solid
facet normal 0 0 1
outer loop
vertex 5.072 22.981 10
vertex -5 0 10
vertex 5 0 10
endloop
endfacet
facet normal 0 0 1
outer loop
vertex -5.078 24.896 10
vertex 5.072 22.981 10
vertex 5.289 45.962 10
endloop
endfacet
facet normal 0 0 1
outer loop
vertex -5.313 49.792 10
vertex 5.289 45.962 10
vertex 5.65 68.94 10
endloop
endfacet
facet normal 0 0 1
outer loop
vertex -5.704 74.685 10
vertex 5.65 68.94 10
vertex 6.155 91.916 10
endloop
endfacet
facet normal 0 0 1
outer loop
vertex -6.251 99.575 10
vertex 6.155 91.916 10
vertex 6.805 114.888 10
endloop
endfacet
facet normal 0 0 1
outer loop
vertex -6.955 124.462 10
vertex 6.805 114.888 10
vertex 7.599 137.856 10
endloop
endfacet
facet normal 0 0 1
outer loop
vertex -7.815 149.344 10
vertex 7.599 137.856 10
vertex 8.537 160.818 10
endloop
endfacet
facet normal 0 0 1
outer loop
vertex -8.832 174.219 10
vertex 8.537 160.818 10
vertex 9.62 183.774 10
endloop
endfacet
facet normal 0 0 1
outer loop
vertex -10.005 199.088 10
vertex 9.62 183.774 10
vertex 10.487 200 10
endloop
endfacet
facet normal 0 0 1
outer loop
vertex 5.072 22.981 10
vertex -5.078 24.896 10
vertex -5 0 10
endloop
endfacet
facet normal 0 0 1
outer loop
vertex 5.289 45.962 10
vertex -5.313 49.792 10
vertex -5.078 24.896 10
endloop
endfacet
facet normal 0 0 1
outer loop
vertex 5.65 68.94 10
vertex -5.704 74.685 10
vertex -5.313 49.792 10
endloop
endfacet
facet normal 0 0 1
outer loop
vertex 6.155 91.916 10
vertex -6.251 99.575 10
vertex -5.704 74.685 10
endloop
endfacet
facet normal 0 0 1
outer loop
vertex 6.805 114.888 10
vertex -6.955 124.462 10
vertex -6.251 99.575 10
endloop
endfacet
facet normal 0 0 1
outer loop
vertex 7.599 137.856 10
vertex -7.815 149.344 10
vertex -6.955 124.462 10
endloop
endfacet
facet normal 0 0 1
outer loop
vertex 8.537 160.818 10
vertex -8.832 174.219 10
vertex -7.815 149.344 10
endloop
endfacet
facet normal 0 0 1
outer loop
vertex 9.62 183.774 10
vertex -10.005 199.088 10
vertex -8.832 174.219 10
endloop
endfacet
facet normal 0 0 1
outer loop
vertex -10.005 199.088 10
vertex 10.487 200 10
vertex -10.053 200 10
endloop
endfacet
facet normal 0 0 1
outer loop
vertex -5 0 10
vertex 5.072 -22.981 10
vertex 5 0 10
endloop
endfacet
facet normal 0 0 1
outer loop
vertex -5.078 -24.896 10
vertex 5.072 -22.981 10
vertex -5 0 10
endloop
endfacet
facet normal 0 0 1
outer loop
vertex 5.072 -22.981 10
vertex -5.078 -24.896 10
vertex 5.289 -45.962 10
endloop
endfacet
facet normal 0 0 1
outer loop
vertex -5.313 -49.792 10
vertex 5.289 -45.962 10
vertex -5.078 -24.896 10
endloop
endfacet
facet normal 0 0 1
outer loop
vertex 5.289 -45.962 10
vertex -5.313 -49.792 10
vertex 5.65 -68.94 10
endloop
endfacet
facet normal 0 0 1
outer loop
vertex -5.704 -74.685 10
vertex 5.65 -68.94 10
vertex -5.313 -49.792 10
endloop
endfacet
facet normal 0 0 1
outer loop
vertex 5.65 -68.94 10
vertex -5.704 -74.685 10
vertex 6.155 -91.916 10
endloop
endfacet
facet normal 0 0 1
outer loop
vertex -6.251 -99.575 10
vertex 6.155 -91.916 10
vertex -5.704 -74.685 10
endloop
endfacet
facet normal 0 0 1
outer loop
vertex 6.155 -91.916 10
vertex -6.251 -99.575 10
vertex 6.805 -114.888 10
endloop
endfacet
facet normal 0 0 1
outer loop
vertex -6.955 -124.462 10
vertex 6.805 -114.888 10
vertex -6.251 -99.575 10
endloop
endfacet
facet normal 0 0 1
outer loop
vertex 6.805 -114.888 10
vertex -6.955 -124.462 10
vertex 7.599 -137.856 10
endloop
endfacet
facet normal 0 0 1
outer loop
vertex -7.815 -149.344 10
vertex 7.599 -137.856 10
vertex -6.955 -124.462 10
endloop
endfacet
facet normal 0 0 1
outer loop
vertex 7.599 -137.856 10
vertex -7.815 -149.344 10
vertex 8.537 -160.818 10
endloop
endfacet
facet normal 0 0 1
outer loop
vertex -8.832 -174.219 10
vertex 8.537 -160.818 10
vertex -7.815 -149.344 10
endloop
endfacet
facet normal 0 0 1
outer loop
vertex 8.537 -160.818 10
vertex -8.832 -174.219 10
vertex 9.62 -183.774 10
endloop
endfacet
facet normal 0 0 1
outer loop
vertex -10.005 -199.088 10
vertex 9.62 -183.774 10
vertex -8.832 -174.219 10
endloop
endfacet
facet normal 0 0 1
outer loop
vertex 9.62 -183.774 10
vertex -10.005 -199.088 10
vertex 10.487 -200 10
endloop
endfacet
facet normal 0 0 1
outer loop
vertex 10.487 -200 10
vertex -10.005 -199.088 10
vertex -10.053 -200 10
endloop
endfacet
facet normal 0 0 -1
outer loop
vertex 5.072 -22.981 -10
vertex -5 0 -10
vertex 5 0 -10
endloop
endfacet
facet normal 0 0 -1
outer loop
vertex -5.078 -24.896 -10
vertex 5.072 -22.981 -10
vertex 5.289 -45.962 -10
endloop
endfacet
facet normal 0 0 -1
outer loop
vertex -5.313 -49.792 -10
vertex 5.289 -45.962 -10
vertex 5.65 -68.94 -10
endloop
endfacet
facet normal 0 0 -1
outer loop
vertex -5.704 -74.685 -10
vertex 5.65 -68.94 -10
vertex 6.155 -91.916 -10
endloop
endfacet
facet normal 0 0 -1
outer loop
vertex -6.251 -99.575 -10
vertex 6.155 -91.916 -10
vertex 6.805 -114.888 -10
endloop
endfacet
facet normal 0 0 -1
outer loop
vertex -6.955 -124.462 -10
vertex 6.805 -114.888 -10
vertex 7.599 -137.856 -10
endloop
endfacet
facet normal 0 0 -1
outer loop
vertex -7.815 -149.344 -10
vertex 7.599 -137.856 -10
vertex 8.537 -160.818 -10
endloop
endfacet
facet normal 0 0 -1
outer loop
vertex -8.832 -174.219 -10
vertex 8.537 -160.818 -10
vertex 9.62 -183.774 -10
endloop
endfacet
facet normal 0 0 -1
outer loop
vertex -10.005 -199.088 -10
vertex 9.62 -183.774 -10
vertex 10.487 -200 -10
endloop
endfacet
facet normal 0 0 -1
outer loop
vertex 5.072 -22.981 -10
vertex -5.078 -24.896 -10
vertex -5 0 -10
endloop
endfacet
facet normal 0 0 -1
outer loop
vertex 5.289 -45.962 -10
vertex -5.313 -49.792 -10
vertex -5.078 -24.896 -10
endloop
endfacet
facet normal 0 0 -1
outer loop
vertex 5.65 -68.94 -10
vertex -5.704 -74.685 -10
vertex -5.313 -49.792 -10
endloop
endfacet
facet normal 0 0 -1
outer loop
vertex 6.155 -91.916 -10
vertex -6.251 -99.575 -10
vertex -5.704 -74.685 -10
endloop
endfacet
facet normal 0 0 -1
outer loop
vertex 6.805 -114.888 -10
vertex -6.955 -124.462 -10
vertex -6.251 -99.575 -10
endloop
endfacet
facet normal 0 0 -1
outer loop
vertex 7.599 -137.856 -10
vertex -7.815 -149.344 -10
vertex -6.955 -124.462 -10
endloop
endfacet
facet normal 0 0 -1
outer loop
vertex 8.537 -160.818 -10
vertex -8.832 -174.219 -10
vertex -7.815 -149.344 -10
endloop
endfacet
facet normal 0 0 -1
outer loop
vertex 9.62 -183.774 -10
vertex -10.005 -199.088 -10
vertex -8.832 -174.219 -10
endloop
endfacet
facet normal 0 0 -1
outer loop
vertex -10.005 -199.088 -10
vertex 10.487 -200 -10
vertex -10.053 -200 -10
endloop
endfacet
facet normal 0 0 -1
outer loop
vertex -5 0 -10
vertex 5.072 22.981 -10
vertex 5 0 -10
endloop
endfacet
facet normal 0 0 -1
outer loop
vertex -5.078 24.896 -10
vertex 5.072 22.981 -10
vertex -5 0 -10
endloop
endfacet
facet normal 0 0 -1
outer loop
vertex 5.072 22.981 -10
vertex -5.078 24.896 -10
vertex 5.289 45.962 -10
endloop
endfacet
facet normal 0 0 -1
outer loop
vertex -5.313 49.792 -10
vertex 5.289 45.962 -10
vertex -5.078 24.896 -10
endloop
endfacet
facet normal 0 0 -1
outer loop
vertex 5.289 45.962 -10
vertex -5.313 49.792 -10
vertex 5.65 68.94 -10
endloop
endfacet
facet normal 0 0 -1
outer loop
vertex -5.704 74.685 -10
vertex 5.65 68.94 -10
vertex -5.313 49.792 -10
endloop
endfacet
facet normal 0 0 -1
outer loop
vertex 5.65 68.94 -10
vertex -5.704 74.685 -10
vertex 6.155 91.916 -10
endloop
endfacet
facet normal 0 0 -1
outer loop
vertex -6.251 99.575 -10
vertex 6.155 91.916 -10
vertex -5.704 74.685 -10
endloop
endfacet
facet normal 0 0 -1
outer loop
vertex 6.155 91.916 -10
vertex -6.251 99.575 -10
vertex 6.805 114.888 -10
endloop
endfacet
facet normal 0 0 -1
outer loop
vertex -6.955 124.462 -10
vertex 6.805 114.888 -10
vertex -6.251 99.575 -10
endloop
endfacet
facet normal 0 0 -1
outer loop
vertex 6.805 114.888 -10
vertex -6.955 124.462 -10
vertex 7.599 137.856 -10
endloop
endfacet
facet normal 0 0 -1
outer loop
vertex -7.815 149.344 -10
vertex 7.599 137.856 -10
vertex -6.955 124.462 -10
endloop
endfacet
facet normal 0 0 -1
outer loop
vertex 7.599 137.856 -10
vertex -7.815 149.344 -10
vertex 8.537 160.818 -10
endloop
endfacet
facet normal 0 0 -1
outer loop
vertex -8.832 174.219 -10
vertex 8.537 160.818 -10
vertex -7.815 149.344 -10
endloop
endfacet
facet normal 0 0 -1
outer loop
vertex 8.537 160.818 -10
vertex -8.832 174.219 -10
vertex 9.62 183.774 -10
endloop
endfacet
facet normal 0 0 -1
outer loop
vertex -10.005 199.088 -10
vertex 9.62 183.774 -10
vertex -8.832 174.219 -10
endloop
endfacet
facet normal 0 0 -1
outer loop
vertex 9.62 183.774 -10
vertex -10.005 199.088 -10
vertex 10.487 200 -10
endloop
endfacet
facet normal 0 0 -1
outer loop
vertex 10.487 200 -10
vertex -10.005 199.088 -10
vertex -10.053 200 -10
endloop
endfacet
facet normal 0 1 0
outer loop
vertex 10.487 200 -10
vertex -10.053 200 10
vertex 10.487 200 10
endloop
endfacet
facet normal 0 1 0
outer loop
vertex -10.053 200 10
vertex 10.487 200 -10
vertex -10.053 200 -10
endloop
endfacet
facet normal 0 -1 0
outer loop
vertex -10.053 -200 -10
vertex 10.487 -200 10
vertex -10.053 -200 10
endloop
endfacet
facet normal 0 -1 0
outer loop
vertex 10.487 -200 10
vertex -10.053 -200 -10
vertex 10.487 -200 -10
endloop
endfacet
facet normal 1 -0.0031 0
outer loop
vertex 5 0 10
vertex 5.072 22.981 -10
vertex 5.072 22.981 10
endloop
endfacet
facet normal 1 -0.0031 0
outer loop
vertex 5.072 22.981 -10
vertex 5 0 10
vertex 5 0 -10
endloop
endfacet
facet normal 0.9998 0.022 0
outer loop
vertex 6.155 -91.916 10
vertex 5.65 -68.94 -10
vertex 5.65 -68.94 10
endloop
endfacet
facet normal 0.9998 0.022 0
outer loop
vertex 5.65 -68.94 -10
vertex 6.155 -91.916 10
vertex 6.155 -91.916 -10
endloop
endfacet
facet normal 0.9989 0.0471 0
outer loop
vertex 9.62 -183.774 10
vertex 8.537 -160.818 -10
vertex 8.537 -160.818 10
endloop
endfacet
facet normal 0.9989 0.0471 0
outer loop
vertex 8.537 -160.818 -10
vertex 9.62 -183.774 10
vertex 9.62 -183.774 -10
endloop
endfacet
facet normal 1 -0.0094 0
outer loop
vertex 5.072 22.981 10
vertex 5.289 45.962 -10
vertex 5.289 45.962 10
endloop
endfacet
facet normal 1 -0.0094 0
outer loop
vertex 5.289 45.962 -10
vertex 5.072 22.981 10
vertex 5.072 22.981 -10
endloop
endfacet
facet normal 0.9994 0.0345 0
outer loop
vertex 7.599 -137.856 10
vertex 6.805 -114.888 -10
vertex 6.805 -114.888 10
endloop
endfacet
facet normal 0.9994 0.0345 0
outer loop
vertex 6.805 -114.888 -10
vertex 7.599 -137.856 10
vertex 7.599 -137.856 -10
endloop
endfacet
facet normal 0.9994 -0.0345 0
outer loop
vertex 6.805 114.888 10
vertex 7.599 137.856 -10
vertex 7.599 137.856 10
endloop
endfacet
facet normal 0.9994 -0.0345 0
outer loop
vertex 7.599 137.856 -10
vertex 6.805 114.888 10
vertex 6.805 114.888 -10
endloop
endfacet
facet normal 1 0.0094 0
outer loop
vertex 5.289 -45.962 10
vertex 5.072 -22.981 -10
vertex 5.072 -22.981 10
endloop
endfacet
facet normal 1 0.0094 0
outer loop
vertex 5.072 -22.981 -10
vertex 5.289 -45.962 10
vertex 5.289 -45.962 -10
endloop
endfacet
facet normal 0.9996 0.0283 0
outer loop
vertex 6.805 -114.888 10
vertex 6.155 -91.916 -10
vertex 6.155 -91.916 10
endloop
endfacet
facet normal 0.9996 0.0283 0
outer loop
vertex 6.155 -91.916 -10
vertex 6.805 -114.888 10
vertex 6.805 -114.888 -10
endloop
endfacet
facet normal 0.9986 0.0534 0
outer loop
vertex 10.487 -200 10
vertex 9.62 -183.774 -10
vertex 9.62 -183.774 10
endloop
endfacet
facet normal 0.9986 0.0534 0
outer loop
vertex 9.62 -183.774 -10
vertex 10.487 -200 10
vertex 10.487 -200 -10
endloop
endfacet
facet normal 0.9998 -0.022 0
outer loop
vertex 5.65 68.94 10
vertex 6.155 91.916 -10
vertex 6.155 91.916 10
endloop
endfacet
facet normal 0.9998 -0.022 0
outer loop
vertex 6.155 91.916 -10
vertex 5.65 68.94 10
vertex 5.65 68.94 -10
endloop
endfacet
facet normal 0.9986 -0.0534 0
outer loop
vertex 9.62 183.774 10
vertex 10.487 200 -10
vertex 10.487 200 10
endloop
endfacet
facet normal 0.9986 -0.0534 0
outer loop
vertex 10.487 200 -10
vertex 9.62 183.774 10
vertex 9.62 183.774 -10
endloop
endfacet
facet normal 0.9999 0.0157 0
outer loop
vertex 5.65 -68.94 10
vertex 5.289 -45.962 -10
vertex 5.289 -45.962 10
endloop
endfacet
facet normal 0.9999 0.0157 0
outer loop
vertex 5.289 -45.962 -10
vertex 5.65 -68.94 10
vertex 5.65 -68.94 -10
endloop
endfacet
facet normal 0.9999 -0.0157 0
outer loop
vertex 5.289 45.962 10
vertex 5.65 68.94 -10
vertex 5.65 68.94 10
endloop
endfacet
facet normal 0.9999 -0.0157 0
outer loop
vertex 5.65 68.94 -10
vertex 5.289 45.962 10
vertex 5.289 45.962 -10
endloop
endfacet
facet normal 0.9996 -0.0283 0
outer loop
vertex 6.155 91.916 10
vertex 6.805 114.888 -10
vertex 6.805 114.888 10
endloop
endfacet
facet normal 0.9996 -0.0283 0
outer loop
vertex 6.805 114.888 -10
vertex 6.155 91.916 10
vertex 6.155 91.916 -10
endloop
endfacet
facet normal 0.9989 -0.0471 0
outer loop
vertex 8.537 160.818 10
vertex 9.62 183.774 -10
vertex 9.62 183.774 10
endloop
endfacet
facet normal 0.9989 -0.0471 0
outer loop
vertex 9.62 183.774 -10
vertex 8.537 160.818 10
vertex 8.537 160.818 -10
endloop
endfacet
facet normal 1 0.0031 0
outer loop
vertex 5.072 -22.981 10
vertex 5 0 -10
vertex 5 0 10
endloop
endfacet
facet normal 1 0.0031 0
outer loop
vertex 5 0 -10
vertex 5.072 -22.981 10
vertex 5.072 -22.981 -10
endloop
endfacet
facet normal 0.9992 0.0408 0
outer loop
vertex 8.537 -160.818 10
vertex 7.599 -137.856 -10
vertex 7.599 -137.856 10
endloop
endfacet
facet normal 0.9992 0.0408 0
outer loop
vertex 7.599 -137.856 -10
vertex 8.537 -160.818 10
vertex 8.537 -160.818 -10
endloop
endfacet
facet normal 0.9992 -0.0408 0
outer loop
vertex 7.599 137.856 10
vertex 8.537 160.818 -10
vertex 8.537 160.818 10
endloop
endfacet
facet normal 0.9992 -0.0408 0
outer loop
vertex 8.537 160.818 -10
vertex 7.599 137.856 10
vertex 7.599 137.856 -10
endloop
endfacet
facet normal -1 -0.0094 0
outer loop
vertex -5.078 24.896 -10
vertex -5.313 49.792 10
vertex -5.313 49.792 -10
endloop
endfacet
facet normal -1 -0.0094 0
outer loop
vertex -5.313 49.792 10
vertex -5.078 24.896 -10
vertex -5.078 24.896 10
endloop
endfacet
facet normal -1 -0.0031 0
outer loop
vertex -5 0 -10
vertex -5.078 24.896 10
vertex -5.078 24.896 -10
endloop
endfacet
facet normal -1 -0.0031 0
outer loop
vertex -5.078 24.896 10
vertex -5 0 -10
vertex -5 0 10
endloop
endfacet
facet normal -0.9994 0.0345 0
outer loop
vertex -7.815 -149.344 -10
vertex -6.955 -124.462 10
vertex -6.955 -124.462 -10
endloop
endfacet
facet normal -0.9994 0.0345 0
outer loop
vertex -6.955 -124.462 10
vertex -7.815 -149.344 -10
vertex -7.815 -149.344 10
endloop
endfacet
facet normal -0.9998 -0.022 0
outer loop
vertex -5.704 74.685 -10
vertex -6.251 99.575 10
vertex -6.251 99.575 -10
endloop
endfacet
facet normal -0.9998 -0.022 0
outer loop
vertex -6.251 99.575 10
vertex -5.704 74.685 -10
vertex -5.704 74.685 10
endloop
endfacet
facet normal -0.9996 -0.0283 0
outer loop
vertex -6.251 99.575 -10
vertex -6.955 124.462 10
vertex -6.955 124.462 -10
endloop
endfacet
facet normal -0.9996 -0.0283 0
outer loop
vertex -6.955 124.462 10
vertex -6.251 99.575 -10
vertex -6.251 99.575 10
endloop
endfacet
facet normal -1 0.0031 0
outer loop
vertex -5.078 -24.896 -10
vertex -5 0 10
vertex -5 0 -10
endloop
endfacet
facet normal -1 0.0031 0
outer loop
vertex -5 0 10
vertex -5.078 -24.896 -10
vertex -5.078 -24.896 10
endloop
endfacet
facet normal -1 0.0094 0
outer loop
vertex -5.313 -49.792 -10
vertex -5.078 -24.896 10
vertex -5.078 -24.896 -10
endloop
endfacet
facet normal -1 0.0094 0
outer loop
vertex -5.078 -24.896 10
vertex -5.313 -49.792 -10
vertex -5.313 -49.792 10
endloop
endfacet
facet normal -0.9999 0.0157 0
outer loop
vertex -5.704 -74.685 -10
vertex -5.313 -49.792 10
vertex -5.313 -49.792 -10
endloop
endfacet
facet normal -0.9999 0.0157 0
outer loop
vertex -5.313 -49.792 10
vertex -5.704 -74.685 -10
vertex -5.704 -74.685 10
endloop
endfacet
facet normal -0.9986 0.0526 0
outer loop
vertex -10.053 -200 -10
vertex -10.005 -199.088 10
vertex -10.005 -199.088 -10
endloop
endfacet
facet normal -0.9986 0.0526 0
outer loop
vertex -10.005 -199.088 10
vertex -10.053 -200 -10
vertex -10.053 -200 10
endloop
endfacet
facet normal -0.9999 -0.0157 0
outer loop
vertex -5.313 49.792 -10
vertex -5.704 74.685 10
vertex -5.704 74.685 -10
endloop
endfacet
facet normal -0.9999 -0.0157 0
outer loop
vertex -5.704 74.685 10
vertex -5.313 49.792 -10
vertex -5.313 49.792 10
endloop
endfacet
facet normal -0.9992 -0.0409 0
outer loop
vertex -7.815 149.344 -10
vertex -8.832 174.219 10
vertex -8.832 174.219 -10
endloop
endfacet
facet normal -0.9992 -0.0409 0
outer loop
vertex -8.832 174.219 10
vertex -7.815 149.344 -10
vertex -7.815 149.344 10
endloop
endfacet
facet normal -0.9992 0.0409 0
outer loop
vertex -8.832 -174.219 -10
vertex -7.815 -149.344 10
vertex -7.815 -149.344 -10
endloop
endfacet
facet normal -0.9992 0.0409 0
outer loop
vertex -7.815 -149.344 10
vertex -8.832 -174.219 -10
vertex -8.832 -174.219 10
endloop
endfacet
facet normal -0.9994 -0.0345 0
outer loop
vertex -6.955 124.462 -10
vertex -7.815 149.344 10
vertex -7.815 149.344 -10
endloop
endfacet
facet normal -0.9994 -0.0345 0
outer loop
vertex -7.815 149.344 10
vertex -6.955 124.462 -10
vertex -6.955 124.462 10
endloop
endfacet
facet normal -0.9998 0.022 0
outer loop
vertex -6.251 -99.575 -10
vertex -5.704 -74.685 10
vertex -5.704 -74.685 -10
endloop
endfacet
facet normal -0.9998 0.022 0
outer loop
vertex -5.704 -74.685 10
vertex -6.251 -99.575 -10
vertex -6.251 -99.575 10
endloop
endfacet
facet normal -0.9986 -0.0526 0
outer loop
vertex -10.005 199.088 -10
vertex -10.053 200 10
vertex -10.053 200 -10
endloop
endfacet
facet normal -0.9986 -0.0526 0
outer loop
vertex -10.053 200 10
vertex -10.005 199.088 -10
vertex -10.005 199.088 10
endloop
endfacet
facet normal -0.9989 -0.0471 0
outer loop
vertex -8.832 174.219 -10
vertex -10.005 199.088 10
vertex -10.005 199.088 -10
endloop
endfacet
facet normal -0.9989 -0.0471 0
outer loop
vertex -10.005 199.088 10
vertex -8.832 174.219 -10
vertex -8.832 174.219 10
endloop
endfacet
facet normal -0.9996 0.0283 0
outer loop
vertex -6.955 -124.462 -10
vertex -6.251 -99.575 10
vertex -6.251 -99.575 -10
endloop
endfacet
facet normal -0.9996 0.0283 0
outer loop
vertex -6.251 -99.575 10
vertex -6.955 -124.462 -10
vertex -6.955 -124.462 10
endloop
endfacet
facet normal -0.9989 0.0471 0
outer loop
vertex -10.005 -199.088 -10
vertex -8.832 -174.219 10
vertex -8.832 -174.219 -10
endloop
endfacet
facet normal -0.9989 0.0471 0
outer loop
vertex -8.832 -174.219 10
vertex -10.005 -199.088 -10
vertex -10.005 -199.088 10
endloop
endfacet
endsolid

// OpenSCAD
$fn = 1000;
module getBar(rad1, rad2, height = 20.0, width = 40.0, length = 400.0){
    
    difference(){
        cube([width, length, height], true);
        translate([0,0,-1])
            rotate([0,0,90])
                text("8/-8.5", .5, halign = "center", valign = "center");
        getCircle(rad1, height, width);
        getCircle(rad2, height, width, true);
    }
}

module getCircle(rad, height, width, reverse = false) {
    if(reverse){
        translate([-getCircleOffset(rad, width),0,-height/2])
            cylinder(height, r = rad, true);
    } else { 
        translate([getCircleOffset(rad, width),0,-height/2])
            cylinder(height, r = rad, true);
    }
}

function getCircleOffset(rad, width) = rad + width / 8;
function getCMFromFeet(ft) = ft * 304.8;

radius1 = getCMFromFeet(7);
radius2 = getCMFromFeet(7.5);
radius3 = getCMFromFeet(8);
radius4 = getCMFromFeet(8.5);
radius5 = getCMFromFeet(9);
radius6 = getCMFromFeet(9.5);
radius7 = getCMFromFeet(10);
radius8 = getCMFromFeet(10.5);
radius9 = getCMFromFeet(11);
radius10 = getCMFromFeet(12);
radius11 = getCMFromFeet(13);

//feetCMRatio = 30.48;

barLength = 400;
getBar(radius10, radius11);
